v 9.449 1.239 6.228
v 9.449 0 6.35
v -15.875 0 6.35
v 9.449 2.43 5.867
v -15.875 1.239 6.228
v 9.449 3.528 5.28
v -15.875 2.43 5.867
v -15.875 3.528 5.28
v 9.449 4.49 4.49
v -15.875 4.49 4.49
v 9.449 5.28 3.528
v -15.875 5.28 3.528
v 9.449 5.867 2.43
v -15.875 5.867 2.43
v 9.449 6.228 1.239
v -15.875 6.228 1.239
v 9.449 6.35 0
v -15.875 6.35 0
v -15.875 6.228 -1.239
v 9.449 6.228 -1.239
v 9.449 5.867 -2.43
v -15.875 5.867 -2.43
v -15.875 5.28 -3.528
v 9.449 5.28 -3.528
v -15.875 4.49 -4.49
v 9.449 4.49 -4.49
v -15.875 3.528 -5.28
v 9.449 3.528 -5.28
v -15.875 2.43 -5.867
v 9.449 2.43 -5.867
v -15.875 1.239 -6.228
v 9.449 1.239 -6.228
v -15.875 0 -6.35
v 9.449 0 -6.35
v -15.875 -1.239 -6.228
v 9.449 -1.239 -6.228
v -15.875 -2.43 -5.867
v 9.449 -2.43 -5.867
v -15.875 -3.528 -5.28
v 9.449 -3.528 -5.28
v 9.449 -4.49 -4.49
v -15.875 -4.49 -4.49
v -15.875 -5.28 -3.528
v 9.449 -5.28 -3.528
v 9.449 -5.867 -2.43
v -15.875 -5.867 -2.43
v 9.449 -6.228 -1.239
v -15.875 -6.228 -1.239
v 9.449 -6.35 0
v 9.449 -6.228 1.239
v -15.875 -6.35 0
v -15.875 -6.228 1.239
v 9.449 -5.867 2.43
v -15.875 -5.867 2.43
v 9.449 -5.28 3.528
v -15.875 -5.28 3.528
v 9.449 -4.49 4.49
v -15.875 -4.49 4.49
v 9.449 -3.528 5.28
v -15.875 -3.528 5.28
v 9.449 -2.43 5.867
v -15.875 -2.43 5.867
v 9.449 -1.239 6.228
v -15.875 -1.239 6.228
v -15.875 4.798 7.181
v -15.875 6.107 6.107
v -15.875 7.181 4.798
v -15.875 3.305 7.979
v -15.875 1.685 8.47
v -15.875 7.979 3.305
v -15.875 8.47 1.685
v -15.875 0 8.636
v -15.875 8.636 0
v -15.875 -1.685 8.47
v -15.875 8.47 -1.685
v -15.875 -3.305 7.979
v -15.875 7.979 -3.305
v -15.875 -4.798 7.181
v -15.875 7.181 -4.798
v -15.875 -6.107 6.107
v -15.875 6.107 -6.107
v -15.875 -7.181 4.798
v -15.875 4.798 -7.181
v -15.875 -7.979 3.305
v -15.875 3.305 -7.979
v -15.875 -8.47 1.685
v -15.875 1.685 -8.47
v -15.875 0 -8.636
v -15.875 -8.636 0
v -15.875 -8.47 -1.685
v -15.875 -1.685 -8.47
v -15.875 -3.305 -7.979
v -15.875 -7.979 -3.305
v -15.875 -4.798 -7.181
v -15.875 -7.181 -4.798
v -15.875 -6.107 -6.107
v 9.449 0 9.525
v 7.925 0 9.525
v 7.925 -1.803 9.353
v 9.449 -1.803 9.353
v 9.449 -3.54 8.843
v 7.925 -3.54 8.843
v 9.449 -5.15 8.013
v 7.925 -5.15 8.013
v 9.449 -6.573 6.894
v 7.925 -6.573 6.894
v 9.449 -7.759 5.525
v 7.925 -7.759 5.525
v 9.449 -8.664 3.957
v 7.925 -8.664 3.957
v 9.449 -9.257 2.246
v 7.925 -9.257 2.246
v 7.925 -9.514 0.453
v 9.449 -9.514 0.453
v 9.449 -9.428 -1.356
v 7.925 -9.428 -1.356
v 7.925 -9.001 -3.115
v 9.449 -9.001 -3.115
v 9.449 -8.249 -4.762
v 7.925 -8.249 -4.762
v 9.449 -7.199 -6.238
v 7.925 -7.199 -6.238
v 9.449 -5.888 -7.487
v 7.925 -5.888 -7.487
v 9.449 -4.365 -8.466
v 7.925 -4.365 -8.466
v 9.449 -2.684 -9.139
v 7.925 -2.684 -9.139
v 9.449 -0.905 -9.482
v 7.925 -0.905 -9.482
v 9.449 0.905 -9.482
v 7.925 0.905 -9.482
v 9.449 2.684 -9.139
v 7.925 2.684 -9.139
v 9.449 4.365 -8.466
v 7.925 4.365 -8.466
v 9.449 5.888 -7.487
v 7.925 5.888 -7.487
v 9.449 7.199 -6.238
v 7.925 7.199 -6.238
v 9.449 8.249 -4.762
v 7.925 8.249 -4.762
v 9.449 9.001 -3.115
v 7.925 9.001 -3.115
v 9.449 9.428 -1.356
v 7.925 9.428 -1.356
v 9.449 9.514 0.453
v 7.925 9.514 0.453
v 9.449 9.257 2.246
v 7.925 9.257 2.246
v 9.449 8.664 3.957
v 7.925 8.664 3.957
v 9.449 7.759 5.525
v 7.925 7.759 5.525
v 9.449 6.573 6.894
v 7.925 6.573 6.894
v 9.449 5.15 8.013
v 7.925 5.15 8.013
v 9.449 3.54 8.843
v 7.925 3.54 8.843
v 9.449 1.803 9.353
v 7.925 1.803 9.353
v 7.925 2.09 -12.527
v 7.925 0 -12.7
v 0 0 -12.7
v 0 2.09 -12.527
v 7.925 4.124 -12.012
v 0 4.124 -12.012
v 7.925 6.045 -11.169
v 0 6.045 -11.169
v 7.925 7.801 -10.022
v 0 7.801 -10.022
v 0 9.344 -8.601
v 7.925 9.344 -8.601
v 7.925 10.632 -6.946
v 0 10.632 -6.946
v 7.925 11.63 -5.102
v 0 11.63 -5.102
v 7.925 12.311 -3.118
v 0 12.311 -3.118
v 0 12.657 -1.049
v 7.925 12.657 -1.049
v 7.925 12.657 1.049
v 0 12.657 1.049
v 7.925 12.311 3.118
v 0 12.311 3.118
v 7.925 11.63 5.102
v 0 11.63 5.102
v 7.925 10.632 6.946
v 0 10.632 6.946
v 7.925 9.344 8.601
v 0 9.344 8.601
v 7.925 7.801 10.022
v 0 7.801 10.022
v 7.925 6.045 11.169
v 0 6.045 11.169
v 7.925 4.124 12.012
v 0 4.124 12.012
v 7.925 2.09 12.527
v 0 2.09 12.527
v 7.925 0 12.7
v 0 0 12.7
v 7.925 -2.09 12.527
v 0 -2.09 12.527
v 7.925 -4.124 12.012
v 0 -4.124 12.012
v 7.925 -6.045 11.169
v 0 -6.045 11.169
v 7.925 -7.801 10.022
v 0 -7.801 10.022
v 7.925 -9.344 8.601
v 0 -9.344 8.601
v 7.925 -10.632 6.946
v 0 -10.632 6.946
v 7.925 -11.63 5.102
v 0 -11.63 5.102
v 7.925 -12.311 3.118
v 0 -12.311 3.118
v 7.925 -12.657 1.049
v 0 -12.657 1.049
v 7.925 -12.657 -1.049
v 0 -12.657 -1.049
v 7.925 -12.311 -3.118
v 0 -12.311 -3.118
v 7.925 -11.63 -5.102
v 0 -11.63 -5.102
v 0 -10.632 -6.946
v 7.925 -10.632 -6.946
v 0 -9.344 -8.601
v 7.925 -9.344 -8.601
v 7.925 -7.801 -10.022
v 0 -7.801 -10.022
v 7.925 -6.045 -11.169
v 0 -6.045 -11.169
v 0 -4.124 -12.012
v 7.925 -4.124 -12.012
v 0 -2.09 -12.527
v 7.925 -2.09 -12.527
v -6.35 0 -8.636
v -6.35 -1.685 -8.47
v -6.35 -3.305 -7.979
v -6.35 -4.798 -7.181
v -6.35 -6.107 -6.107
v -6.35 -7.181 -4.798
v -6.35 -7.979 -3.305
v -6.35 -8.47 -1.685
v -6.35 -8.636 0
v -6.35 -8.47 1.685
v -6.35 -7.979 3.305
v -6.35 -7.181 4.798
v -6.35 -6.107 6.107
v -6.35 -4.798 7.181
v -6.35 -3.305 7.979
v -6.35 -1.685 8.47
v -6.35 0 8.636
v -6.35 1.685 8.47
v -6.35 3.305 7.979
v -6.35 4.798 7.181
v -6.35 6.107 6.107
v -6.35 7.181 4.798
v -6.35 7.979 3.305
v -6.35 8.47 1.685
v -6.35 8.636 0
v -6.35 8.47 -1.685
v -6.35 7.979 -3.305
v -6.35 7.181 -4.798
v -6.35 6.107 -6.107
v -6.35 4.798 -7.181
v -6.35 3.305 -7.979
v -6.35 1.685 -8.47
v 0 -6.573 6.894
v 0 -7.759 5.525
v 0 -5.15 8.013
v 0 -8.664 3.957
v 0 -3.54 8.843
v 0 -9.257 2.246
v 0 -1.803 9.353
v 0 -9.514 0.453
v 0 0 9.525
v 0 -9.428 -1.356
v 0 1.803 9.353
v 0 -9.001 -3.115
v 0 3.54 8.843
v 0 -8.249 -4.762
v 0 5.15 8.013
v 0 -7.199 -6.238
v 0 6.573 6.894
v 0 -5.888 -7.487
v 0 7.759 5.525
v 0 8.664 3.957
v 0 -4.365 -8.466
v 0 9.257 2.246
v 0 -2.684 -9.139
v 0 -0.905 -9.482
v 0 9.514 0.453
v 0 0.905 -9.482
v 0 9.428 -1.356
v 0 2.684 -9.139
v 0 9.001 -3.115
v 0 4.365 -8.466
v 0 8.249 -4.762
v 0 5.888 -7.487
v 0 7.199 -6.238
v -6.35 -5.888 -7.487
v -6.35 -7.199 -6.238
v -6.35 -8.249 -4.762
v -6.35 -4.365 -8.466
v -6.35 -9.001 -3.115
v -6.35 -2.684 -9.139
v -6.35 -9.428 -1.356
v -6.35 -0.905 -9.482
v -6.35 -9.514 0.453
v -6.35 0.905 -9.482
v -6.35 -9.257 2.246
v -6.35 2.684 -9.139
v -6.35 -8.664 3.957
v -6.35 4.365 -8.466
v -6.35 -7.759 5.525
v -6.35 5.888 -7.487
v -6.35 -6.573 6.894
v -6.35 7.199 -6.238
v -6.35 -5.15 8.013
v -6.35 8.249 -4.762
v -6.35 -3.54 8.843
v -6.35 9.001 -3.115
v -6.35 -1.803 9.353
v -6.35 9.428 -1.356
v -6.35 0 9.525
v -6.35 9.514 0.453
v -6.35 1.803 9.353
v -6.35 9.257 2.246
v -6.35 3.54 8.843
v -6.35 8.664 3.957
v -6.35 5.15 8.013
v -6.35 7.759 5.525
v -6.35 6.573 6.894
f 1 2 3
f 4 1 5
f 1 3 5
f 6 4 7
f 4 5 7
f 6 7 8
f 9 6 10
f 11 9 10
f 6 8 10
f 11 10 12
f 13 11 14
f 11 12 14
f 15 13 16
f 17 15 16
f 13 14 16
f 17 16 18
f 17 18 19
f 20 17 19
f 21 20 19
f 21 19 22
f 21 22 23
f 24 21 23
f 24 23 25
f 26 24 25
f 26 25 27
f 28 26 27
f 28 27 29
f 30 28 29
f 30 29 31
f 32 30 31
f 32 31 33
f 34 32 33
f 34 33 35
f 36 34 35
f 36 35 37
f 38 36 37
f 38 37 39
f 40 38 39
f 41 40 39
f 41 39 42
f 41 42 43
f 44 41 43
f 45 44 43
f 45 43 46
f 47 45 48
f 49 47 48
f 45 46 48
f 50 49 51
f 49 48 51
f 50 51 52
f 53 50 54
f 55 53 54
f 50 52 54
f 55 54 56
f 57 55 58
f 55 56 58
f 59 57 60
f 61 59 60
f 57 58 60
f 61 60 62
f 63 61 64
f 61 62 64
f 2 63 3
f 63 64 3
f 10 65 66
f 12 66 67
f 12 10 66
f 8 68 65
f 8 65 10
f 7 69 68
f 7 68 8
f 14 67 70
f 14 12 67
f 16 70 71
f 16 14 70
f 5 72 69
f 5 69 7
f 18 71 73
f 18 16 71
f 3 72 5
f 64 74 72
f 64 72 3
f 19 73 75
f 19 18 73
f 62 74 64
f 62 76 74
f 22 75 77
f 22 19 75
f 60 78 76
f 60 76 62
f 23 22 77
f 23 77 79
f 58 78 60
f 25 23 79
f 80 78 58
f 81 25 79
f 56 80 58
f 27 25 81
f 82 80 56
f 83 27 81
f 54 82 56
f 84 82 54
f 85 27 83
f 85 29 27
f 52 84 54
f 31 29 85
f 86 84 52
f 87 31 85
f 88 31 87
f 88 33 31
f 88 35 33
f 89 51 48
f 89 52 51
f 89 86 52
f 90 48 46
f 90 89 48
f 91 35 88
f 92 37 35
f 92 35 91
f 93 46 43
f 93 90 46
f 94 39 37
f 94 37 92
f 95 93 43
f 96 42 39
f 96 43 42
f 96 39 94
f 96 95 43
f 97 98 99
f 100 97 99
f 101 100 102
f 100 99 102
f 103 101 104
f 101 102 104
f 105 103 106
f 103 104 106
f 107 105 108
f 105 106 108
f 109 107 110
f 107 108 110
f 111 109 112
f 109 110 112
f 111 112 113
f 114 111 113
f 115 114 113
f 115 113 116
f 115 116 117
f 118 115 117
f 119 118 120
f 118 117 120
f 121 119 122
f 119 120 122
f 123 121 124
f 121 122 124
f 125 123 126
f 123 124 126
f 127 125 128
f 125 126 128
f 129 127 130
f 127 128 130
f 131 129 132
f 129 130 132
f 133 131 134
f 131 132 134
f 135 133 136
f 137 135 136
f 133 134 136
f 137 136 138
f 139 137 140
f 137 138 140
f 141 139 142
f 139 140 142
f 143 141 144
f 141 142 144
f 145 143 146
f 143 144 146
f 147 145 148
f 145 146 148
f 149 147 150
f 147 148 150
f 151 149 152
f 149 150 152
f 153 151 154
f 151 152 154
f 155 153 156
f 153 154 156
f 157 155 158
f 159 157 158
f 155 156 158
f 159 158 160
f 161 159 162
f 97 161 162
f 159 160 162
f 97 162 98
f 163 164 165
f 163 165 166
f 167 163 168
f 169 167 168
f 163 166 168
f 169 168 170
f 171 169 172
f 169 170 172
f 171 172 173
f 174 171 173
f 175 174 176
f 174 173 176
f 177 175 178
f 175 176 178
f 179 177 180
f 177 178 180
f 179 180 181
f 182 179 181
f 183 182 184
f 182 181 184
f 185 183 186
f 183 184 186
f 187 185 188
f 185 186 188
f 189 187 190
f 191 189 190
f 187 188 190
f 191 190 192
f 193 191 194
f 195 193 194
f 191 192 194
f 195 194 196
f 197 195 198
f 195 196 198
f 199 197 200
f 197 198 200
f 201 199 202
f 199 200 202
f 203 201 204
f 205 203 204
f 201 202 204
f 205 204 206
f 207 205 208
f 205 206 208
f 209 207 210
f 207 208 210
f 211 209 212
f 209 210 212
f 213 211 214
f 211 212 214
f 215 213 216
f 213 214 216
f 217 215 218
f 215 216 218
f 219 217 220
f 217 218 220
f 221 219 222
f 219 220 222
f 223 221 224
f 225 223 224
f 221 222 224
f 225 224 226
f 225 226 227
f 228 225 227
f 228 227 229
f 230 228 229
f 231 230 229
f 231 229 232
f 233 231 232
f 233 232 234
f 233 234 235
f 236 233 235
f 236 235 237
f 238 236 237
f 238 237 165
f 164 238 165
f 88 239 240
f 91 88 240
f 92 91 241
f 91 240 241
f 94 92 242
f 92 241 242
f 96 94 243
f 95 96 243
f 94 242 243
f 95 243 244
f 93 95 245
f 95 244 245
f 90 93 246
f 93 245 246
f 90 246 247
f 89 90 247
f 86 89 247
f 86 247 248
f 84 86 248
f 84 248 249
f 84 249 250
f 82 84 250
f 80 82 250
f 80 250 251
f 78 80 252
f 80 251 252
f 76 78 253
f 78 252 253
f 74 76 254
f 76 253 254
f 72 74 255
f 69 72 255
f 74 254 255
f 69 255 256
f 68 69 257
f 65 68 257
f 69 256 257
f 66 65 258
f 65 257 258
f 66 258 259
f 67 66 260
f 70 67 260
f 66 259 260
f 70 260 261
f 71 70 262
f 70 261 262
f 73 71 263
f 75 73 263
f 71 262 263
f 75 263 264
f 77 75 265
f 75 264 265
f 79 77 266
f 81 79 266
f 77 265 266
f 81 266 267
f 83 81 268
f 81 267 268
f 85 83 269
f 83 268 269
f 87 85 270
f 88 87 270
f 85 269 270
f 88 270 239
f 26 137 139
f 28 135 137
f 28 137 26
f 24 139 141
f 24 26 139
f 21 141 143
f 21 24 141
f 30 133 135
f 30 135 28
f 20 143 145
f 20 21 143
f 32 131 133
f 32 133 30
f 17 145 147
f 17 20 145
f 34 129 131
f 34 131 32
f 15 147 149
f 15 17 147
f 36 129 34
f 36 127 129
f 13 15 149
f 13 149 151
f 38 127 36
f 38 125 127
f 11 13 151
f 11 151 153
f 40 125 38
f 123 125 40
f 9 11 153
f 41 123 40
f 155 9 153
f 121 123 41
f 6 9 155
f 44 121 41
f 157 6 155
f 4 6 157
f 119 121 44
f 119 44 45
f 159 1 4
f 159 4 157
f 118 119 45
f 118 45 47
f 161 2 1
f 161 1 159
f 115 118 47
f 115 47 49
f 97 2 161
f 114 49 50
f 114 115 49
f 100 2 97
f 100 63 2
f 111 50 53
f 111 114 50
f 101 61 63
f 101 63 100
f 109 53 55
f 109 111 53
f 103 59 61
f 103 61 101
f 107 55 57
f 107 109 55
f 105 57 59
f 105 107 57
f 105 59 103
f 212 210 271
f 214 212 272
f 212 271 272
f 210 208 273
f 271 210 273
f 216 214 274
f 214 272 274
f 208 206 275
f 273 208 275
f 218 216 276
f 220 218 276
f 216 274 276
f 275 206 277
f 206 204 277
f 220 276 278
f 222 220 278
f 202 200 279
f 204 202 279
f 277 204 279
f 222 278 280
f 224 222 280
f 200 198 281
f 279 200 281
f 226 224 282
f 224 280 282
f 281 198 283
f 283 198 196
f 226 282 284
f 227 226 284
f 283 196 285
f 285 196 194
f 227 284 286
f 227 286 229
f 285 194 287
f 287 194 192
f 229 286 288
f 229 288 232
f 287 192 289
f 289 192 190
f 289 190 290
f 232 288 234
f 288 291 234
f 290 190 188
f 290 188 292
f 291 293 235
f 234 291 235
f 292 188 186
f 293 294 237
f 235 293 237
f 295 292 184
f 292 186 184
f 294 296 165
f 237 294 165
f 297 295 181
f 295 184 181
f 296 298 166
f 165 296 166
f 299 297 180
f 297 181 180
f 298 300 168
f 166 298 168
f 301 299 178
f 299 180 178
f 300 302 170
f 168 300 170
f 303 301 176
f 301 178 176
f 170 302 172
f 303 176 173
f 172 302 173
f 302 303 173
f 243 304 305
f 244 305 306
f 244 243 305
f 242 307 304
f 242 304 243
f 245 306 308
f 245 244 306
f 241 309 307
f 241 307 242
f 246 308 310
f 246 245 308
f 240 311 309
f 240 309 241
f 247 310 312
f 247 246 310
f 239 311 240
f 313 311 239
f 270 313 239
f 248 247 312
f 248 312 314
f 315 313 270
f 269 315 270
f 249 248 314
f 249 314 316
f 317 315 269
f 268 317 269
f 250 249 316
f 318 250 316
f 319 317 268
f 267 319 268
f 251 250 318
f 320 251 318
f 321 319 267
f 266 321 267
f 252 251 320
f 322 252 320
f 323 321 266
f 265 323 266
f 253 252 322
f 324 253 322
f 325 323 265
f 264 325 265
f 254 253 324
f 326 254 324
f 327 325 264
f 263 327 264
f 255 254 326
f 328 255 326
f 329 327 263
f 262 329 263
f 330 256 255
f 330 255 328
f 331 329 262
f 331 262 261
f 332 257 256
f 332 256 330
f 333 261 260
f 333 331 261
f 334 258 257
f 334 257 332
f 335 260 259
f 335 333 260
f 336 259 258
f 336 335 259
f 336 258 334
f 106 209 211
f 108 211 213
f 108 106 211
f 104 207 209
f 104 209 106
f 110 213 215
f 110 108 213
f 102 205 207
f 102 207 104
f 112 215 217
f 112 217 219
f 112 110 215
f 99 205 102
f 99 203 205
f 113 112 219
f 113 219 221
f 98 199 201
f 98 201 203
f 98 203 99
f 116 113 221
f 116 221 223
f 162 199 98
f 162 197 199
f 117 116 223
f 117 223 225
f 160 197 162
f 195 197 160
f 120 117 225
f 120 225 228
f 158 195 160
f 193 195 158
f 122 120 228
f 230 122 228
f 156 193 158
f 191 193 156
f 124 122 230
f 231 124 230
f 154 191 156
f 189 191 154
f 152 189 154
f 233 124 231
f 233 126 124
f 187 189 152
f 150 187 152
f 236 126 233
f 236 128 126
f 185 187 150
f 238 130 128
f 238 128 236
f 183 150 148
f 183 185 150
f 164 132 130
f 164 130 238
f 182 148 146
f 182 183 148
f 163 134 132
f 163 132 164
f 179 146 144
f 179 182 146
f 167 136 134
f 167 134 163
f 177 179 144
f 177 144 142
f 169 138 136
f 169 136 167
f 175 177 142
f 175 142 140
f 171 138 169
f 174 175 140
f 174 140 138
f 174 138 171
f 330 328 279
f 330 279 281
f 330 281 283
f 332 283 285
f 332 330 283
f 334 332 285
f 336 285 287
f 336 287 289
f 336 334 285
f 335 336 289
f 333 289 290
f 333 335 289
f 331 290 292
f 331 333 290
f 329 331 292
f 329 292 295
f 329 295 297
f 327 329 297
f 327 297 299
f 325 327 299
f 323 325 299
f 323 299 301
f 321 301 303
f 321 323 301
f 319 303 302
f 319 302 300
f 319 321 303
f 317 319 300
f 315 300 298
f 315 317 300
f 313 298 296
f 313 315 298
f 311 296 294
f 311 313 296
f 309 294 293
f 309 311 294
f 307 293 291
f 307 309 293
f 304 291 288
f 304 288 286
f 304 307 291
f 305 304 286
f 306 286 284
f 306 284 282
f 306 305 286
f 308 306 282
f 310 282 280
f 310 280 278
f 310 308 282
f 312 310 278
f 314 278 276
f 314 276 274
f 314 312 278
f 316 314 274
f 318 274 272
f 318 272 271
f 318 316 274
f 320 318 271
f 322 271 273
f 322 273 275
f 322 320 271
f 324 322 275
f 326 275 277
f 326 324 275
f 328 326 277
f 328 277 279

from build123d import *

# Parameters (mm, degrees)
SKETCH1_R           = 12.7
BOSS_EXTRUDE1_DEPTH = 7.9248
SKETCH2_R           = 9.525
BOSS_EXTRUDE2_DEPTH = 1.524
BOSS_EXTRUDE4_START = 6.35
SKETCH4_R           = 9.525
BOSS_EXTRUDE4_DEPTH = 6.35
SKETCH5_R           = 8.636
BOSS_EXTRUDE5_DEPTH = 9.525
SKETCH6_R           = 6.35
CUT_EXTRUDE1_DEPTH  = 25.4


with BuildPart() as part:
    # Sketch1 → Boss-Extrude1 (new body)
    with BuildSketch(Plane(origin=(0, 0, 0), x_dir=(0, 0, -1), z_dir=(1, 0, 0))):
        Circle(SKETCH1_R)
    extrude(amount=BOSS_EXTRUDE1_DEPTH)

    # Sketch2 → Boss-Extrude2 (add)
    with BuildSketch(Plane(origin=(7.9248, 0, 0), x_dir=(0, 0, -1), z_dir=(1, 0, 0))):
        with Locations(Location((0, 0, 0), (0, 0, 180))):
            Circle(SKETCH2_R)
    extrude(amount=BOSS_EXTRUDE2_DEPTH)

    # Sketch4 → Boss-Extrude4 (add)
    with BuildSketch(Plane.ZY.offset(BOSS_EXTRUDE4_START)):
        Circle(SKETCH4_R)
    extrude(amount=-BOSS_EXTRUDE4_DEPTH)

    # Sketch5 → Boss-Extrude5 (add)
    with BuildSketch(Plane.ZY.offset(6.35)):
        with Locations(Location((0, 0, 0), (0, 0, 180))):
            Circle(SKETCH5_R)
    extrude(amount=BOSS_EXTRUDE5_DEPTH)

    # Sketch6 → Cut-Extrude1 (cut)
    with BuildSketch(Plane.ZY.offset(15.875)):
        Circle(SKETCH6_R)
    extrude(amount=-CUT_EXTRUDE1_DEPTH, mode=Mode.SUBTRACT)


solid = part.part
